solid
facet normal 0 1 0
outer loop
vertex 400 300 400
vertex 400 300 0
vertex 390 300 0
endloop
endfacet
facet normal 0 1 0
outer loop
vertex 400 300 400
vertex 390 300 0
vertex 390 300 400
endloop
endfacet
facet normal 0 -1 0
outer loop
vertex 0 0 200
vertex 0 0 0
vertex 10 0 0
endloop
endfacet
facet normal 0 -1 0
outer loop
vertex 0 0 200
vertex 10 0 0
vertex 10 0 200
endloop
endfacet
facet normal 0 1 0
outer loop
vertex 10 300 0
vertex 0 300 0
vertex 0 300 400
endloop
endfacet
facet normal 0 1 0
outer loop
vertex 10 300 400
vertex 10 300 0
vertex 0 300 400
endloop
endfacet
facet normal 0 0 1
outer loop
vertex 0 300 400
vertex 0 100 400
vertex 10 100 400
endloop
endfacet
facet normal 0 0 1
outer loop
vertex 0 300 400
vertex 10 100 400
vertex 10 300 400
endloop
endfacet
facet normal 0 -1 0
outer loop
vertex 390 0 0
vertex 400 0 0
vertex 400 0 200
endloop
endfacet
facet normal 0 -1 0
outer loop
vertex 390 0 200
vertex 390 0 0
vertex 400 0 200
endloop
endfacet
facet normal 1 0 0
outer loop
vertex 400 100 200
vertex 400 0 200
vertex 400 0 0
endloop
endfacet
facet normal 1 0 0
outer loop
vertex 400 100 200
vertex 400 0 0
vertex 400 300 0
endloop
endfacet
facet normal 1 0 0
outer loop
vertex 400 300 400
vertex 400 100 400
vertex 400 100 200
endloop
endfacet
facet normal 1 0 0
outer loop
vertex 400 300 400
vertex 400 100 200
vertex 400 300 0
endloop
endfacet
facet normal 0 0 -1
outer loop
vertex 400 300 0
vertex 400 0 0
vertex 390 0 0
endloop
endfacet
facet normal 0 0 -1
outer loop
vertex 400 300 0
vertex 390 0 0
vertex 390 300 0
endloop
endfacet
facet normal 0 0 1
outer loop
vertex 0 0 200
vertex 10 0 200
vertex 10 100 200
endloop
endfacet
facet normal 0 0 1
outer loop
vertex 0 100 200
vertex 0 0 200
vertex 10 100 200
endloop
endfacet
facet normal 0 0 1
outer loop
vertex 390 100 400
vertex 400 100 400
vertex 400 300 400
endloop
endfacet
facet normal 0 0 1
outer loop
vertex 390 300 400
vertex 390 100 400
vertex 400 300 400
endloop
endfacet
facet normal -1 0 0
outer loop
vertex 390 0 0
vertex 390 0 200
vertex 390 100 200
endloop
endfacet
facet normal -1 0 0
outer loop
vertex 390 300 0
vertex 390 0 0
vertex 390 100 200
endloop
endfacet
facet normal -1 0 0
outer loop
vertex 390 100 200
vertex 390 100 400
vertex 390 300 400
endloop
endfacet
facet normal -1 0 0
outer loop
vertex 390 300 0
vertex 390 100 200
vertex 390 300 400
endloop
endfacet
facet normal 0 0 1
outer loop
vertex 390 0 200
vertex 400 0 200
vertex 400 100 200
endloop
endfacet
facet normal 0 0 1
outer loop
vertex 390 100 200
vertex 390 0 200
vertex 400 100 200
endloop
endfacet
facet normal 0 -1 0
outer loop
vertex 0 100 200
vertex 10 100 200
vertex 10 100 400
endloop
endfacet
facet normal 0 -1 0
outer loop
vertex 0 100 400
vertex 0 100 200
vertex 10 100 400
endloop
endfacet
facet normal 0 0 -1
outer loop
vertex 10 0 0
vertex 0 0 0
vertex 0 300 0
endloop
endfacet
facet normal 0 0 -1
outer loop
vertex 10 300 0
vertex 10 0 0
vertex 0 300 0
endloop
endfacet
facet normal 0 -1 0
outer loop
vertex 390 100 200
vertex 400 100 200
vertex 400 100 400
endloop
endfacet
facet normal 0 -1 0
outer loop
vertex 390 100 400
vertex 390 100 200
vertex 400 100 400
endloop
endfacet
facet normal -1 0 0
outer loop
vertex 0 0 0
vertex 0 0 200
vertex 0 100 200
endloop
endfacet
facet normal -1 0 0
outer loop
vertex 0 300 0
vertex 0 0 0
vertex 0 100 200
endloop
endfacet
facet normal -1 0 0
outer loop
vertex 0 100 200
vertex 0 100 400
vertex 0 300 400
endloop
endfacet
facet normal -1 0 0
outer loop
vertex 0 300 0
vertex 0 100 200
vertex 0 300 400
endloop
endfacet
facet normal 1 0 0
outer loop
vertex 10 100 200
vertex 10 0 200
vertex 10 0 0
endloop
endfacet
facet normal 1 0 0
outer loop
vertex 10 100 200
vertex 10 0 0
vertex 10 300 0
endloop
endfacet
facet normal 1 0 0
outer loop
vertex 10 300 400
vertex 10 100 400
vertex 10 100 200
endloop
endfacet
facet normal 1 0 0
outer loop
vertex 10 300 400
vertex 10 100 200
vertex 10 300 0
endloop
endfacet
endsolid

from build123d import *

# Parameters (mm, degrees)
F0_W     = 300
F0_H     = 400
F2_DEPTH = 10
F5_W     = 100
F5_H     = 200
F6_DEPTH = 400.001


with BuildPart() as f2:
    # F0 (on Right) → F2 (new body)
    with BuildSketch(Plane.YZ):
        with Locations((150, 200)):
            Rectangle(F0_W, F0_H)
    extrude(amount=F2_DEPTH)


with BuildPart() as f4_1:
    # F4: instance of F2
    add(f2.part.mirror(Plane.YZ.offset(200)))


with BuildPart() as f6_tool:
    # F5 (on face) → F6 (new body, through all)
    with BuildSketch(Plane.YZ.offset(400)):
        with Locations((50, 300)):
            Rectangle(F5_W, F5_H)
    extrude(amount=-F6_DEPTH)


with BuildPart() as f2_1:
    add(f2.part)

    # F6: cut by f6_tool
    add(f6_tool.part, mode=Mode.SUBTRACT)


with BuildPart() as f4_1_1:
    add(f4_1.part)

    # F6: cut by f6_tool
    add(f6_tool.part, mode=Mode.SUBTRACT)


solid = Compound([f2_1.part, f4_1_1.part])
